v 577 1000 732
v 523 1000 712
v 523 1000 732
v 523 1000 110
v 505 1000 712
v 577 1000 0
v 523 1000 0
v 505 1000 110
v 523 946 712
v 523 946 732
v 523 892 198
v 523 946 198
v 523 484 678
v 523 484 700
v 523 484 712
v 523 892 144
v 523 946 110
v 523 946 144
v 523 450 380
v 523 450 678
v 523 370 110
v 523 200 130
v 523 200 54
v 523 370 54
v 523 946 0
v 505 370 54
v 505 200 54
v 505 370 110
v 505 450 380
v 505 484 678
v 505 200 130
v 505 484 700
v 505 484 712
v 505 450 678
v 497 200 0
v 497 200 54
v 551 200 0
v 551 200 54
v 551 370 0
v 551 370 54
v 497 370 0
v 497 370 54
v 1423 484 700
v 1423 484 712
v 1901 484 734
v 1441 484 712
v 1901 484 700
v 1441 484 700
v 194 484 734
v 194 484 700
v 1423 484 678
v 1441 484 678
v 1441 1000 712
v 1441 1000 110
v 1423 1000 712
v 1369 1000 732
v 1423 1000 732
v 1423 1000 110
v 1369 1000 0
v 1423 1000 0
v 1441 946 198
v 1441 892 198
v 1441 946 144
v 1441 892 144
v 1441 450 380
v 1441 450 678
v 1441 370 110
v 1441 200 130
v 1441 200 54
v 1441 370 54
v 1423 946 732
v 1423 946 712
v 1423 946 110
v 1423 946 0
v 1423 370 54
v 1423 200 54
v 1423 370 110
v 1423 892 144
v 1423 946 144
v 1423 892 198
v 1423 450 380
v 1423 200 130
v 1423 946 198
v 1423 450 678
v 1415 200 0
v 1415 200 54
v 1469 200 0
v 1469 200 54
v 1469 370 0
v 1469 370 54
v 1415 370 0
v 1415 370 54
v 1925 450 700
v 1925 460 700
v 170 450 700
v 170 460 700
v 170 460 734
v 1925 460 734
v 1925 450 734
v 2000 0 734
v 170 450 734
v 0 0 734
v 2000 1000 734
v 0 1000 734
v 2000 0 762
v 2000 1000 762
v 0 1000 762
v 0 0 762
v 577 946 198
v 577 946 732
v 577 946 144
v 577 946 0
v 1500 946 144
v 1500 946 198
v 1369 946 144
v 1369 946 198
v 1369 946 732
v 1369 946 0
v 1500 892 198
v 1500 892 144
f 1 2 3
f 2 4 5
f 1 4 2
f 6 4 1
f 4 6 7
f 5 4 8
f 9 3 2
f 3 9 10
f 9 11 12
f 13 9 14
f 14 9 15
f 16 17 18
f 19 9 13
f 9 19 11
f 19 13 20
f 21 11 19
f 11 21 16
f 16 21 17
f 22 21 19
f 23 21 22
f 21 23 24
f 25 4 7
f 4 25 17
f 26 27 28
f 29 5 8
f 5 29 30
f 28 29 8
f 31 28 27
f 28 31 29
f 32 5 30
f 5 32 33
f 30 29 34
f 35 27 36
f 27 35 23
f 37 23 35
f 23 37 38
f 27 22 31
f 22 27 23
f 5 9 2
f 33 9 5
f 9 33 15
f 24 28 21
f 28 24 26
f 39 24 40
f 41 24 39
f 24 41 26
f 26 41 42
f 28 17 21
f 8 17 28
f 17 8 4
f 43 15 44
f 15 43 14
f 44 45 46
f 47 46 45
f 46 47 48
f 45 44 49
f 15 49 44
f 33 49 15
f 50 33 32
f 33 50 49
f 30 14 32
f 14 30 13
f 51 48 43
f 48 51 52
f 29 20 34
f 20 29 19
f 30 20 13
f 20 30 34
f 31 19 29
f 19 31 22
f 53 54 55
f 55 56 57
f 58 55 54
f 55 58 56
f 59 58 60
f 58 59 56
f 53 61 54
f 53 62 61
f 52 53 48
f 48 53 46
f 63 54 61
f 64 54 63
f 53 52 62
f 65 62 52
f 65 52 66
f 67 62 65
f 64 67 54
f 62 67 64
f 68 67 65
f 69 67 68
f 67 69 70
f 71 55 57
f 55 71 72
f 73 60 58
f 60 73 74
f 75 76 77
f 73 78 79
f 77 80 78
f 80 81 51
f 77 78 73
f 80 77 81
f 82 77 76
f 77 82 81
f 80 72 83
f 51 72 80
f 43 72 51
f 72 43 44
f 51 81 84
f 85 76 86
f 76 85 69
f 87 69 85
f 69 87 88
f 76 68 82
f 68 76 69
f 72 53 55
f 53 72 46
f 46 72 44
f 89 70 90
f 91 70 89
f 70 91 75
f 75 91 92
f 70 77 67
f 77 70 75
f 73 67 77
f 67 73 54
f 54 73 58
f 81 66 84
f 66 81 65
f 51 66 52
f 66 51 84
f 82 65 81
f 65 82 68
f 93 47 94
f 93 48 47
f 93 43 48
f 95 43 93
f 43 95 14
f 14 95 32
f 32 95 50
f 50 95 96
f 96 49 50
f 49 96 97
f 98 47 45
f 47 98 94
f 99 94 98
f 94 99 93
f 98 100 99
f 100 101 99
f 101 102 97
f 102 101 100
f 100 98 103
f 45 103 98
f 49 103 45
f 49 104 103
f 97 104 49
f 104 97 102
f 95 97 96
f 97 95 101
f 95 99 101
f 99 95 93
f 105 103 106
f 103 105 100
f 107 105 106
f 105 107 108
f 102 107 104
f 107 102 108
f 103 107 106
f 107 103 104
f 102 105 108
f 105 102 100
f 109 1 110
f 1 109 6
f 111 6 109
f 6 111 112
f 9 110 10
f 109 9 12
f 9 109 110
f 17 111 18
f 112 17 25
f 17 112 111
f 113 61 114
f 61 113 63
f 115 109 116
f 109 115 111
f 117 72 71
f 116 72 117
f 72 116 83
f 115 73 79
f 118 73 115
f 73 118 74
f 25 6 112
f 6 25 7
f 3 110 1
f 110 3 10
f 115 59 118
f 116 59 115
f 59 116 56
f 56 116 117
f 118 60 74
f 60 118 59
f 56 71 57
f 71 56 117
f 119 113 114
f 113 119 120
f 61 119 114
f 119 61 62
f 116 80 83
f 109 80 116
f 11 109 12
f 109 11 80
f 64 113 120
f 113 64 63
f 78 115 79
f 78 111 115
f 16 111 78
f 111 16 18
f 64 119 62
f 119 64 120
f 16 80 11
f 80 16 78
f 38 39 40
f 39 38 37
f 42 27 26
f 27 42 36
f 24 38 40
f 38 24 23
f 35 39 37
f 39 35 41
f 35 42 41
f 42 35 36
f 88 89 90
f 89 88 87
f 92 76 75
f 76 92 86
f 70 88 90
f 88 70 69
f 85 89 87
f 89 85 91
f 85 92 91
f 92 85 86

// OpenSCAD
// projection(cut=false) ausgelegt();
aufgebaut();

staerke = 18;
fraeser = 3;

module ausgelegt() {
  tischplatte();

  translate([800,1050+760-28-54]) {
  rotate([0,0,180]){
      seite();
      translate([170+fraeser,0,0])
        strebe();
    }
  }
  translate([800-250+fraeser,1050]){
    seite();
    translate([170+fraeser,0,0])
      strebe();
  }

  translate([1700,1050])
    bein();


  translate([1800,1050])
    bein();

  translate([0,1800])
    quer_k();
  translate([0,1870])
    quer_g();

  translate([1100,1870])
    plattenhalter();
  translate([1100,1950])
    plattenhalter();

  translate([1600,1870])
    strebenhalter();
  translate([1600,1950])
    strebenhalter();

  translate([1900,1050])
    fuss();
  translate([1900,1300])
    fuss();

}

module aufgebaut(){
  // tischplatte
  translate([0,0,734])
    tischplatte();

  translate([550-54/2,1000,0])
    rotate([90,0,0])
    bein();

  translate([550+900-54-54/2,1000,0])
  rotate([90,0,0])
    bein();

  translate([550-18-54/2,1000-54-54,110+34])
    quer_g();

  translate([505,200,34])
    rotate([90,0,90])
      seite();

  translate([505+900+18,200,34])
    rotate([90,0,90])
      seite();

  translate([505-(34-18)/2,200,0])
    fuss();

  translate([505+900+18-(34-18)/2,200,0])
    fuss();

  translate([170,450,734-34])
    quer_k();
}

module seite() {


  difference(){
    // grundplatte
    cube([800,760-28-54,staerke]);

    // hubwagen cut
    translate([170,0,0])
      hubwagen();

//    // querbalken gross cut
//    translate([750-54,110,0])
//      cube([54*2,54,staerke]);

    // querbalken klein cut
    translate([250,760-28-54-34,0])
      cube([34,34,staerke]);

    // ausschnitt
    translate([0,150-54,0])
      rotate([0,0,45])
        cube([250*sqrt(2),600,staerke]);
    translate([0,150-54+250,0])
      cube([250,375,staerke]);
  }
}

module bein(){
  cube([54,760-28,54]);
}

module quer_g(){
  cube([995,54,54]);
}

module quer_k(){
  difference(){
    cube([2000-110*2-25,34,34]);

    translate([-10,0,0]){
      rotate([0,0,45])
       cube([50,50,50]);
      translate([2000-110*2-5,0,0])
        rotate([0,0,45])
         cube([50,50,50]);
    }
  }
}

module fuss(){
  cube([54,170,54]);
}

module tischplatte(){
  cube([2000,1000,28]);
}

module plattenhalter(){
    cube([800-250-34-54,34,34]);
}

module strebenhalter(){
  difference(){
    cube([110,34,34]);

    rotate([0,0,45])
      cube([50,50,50]);
  }
}

module hubwagen(){
  cube([800-170,130-54,staerke]);
}

module strebe(){
  difference(){
    hubwagen();

    translate([0,130-54-fraeser,0])
      cube([800-170,fraeser,staerke]);
    translate([800-170-fraeser,0,0])
      cube([fraeser,130-54,staerke]);

    rotate([0,0,45])
       cube([200,200,staerke]);
    translate([800-170-fraeser,0,0])
      rotate([0,0,45])
       cube([200,200,staerke]);
  }
}
